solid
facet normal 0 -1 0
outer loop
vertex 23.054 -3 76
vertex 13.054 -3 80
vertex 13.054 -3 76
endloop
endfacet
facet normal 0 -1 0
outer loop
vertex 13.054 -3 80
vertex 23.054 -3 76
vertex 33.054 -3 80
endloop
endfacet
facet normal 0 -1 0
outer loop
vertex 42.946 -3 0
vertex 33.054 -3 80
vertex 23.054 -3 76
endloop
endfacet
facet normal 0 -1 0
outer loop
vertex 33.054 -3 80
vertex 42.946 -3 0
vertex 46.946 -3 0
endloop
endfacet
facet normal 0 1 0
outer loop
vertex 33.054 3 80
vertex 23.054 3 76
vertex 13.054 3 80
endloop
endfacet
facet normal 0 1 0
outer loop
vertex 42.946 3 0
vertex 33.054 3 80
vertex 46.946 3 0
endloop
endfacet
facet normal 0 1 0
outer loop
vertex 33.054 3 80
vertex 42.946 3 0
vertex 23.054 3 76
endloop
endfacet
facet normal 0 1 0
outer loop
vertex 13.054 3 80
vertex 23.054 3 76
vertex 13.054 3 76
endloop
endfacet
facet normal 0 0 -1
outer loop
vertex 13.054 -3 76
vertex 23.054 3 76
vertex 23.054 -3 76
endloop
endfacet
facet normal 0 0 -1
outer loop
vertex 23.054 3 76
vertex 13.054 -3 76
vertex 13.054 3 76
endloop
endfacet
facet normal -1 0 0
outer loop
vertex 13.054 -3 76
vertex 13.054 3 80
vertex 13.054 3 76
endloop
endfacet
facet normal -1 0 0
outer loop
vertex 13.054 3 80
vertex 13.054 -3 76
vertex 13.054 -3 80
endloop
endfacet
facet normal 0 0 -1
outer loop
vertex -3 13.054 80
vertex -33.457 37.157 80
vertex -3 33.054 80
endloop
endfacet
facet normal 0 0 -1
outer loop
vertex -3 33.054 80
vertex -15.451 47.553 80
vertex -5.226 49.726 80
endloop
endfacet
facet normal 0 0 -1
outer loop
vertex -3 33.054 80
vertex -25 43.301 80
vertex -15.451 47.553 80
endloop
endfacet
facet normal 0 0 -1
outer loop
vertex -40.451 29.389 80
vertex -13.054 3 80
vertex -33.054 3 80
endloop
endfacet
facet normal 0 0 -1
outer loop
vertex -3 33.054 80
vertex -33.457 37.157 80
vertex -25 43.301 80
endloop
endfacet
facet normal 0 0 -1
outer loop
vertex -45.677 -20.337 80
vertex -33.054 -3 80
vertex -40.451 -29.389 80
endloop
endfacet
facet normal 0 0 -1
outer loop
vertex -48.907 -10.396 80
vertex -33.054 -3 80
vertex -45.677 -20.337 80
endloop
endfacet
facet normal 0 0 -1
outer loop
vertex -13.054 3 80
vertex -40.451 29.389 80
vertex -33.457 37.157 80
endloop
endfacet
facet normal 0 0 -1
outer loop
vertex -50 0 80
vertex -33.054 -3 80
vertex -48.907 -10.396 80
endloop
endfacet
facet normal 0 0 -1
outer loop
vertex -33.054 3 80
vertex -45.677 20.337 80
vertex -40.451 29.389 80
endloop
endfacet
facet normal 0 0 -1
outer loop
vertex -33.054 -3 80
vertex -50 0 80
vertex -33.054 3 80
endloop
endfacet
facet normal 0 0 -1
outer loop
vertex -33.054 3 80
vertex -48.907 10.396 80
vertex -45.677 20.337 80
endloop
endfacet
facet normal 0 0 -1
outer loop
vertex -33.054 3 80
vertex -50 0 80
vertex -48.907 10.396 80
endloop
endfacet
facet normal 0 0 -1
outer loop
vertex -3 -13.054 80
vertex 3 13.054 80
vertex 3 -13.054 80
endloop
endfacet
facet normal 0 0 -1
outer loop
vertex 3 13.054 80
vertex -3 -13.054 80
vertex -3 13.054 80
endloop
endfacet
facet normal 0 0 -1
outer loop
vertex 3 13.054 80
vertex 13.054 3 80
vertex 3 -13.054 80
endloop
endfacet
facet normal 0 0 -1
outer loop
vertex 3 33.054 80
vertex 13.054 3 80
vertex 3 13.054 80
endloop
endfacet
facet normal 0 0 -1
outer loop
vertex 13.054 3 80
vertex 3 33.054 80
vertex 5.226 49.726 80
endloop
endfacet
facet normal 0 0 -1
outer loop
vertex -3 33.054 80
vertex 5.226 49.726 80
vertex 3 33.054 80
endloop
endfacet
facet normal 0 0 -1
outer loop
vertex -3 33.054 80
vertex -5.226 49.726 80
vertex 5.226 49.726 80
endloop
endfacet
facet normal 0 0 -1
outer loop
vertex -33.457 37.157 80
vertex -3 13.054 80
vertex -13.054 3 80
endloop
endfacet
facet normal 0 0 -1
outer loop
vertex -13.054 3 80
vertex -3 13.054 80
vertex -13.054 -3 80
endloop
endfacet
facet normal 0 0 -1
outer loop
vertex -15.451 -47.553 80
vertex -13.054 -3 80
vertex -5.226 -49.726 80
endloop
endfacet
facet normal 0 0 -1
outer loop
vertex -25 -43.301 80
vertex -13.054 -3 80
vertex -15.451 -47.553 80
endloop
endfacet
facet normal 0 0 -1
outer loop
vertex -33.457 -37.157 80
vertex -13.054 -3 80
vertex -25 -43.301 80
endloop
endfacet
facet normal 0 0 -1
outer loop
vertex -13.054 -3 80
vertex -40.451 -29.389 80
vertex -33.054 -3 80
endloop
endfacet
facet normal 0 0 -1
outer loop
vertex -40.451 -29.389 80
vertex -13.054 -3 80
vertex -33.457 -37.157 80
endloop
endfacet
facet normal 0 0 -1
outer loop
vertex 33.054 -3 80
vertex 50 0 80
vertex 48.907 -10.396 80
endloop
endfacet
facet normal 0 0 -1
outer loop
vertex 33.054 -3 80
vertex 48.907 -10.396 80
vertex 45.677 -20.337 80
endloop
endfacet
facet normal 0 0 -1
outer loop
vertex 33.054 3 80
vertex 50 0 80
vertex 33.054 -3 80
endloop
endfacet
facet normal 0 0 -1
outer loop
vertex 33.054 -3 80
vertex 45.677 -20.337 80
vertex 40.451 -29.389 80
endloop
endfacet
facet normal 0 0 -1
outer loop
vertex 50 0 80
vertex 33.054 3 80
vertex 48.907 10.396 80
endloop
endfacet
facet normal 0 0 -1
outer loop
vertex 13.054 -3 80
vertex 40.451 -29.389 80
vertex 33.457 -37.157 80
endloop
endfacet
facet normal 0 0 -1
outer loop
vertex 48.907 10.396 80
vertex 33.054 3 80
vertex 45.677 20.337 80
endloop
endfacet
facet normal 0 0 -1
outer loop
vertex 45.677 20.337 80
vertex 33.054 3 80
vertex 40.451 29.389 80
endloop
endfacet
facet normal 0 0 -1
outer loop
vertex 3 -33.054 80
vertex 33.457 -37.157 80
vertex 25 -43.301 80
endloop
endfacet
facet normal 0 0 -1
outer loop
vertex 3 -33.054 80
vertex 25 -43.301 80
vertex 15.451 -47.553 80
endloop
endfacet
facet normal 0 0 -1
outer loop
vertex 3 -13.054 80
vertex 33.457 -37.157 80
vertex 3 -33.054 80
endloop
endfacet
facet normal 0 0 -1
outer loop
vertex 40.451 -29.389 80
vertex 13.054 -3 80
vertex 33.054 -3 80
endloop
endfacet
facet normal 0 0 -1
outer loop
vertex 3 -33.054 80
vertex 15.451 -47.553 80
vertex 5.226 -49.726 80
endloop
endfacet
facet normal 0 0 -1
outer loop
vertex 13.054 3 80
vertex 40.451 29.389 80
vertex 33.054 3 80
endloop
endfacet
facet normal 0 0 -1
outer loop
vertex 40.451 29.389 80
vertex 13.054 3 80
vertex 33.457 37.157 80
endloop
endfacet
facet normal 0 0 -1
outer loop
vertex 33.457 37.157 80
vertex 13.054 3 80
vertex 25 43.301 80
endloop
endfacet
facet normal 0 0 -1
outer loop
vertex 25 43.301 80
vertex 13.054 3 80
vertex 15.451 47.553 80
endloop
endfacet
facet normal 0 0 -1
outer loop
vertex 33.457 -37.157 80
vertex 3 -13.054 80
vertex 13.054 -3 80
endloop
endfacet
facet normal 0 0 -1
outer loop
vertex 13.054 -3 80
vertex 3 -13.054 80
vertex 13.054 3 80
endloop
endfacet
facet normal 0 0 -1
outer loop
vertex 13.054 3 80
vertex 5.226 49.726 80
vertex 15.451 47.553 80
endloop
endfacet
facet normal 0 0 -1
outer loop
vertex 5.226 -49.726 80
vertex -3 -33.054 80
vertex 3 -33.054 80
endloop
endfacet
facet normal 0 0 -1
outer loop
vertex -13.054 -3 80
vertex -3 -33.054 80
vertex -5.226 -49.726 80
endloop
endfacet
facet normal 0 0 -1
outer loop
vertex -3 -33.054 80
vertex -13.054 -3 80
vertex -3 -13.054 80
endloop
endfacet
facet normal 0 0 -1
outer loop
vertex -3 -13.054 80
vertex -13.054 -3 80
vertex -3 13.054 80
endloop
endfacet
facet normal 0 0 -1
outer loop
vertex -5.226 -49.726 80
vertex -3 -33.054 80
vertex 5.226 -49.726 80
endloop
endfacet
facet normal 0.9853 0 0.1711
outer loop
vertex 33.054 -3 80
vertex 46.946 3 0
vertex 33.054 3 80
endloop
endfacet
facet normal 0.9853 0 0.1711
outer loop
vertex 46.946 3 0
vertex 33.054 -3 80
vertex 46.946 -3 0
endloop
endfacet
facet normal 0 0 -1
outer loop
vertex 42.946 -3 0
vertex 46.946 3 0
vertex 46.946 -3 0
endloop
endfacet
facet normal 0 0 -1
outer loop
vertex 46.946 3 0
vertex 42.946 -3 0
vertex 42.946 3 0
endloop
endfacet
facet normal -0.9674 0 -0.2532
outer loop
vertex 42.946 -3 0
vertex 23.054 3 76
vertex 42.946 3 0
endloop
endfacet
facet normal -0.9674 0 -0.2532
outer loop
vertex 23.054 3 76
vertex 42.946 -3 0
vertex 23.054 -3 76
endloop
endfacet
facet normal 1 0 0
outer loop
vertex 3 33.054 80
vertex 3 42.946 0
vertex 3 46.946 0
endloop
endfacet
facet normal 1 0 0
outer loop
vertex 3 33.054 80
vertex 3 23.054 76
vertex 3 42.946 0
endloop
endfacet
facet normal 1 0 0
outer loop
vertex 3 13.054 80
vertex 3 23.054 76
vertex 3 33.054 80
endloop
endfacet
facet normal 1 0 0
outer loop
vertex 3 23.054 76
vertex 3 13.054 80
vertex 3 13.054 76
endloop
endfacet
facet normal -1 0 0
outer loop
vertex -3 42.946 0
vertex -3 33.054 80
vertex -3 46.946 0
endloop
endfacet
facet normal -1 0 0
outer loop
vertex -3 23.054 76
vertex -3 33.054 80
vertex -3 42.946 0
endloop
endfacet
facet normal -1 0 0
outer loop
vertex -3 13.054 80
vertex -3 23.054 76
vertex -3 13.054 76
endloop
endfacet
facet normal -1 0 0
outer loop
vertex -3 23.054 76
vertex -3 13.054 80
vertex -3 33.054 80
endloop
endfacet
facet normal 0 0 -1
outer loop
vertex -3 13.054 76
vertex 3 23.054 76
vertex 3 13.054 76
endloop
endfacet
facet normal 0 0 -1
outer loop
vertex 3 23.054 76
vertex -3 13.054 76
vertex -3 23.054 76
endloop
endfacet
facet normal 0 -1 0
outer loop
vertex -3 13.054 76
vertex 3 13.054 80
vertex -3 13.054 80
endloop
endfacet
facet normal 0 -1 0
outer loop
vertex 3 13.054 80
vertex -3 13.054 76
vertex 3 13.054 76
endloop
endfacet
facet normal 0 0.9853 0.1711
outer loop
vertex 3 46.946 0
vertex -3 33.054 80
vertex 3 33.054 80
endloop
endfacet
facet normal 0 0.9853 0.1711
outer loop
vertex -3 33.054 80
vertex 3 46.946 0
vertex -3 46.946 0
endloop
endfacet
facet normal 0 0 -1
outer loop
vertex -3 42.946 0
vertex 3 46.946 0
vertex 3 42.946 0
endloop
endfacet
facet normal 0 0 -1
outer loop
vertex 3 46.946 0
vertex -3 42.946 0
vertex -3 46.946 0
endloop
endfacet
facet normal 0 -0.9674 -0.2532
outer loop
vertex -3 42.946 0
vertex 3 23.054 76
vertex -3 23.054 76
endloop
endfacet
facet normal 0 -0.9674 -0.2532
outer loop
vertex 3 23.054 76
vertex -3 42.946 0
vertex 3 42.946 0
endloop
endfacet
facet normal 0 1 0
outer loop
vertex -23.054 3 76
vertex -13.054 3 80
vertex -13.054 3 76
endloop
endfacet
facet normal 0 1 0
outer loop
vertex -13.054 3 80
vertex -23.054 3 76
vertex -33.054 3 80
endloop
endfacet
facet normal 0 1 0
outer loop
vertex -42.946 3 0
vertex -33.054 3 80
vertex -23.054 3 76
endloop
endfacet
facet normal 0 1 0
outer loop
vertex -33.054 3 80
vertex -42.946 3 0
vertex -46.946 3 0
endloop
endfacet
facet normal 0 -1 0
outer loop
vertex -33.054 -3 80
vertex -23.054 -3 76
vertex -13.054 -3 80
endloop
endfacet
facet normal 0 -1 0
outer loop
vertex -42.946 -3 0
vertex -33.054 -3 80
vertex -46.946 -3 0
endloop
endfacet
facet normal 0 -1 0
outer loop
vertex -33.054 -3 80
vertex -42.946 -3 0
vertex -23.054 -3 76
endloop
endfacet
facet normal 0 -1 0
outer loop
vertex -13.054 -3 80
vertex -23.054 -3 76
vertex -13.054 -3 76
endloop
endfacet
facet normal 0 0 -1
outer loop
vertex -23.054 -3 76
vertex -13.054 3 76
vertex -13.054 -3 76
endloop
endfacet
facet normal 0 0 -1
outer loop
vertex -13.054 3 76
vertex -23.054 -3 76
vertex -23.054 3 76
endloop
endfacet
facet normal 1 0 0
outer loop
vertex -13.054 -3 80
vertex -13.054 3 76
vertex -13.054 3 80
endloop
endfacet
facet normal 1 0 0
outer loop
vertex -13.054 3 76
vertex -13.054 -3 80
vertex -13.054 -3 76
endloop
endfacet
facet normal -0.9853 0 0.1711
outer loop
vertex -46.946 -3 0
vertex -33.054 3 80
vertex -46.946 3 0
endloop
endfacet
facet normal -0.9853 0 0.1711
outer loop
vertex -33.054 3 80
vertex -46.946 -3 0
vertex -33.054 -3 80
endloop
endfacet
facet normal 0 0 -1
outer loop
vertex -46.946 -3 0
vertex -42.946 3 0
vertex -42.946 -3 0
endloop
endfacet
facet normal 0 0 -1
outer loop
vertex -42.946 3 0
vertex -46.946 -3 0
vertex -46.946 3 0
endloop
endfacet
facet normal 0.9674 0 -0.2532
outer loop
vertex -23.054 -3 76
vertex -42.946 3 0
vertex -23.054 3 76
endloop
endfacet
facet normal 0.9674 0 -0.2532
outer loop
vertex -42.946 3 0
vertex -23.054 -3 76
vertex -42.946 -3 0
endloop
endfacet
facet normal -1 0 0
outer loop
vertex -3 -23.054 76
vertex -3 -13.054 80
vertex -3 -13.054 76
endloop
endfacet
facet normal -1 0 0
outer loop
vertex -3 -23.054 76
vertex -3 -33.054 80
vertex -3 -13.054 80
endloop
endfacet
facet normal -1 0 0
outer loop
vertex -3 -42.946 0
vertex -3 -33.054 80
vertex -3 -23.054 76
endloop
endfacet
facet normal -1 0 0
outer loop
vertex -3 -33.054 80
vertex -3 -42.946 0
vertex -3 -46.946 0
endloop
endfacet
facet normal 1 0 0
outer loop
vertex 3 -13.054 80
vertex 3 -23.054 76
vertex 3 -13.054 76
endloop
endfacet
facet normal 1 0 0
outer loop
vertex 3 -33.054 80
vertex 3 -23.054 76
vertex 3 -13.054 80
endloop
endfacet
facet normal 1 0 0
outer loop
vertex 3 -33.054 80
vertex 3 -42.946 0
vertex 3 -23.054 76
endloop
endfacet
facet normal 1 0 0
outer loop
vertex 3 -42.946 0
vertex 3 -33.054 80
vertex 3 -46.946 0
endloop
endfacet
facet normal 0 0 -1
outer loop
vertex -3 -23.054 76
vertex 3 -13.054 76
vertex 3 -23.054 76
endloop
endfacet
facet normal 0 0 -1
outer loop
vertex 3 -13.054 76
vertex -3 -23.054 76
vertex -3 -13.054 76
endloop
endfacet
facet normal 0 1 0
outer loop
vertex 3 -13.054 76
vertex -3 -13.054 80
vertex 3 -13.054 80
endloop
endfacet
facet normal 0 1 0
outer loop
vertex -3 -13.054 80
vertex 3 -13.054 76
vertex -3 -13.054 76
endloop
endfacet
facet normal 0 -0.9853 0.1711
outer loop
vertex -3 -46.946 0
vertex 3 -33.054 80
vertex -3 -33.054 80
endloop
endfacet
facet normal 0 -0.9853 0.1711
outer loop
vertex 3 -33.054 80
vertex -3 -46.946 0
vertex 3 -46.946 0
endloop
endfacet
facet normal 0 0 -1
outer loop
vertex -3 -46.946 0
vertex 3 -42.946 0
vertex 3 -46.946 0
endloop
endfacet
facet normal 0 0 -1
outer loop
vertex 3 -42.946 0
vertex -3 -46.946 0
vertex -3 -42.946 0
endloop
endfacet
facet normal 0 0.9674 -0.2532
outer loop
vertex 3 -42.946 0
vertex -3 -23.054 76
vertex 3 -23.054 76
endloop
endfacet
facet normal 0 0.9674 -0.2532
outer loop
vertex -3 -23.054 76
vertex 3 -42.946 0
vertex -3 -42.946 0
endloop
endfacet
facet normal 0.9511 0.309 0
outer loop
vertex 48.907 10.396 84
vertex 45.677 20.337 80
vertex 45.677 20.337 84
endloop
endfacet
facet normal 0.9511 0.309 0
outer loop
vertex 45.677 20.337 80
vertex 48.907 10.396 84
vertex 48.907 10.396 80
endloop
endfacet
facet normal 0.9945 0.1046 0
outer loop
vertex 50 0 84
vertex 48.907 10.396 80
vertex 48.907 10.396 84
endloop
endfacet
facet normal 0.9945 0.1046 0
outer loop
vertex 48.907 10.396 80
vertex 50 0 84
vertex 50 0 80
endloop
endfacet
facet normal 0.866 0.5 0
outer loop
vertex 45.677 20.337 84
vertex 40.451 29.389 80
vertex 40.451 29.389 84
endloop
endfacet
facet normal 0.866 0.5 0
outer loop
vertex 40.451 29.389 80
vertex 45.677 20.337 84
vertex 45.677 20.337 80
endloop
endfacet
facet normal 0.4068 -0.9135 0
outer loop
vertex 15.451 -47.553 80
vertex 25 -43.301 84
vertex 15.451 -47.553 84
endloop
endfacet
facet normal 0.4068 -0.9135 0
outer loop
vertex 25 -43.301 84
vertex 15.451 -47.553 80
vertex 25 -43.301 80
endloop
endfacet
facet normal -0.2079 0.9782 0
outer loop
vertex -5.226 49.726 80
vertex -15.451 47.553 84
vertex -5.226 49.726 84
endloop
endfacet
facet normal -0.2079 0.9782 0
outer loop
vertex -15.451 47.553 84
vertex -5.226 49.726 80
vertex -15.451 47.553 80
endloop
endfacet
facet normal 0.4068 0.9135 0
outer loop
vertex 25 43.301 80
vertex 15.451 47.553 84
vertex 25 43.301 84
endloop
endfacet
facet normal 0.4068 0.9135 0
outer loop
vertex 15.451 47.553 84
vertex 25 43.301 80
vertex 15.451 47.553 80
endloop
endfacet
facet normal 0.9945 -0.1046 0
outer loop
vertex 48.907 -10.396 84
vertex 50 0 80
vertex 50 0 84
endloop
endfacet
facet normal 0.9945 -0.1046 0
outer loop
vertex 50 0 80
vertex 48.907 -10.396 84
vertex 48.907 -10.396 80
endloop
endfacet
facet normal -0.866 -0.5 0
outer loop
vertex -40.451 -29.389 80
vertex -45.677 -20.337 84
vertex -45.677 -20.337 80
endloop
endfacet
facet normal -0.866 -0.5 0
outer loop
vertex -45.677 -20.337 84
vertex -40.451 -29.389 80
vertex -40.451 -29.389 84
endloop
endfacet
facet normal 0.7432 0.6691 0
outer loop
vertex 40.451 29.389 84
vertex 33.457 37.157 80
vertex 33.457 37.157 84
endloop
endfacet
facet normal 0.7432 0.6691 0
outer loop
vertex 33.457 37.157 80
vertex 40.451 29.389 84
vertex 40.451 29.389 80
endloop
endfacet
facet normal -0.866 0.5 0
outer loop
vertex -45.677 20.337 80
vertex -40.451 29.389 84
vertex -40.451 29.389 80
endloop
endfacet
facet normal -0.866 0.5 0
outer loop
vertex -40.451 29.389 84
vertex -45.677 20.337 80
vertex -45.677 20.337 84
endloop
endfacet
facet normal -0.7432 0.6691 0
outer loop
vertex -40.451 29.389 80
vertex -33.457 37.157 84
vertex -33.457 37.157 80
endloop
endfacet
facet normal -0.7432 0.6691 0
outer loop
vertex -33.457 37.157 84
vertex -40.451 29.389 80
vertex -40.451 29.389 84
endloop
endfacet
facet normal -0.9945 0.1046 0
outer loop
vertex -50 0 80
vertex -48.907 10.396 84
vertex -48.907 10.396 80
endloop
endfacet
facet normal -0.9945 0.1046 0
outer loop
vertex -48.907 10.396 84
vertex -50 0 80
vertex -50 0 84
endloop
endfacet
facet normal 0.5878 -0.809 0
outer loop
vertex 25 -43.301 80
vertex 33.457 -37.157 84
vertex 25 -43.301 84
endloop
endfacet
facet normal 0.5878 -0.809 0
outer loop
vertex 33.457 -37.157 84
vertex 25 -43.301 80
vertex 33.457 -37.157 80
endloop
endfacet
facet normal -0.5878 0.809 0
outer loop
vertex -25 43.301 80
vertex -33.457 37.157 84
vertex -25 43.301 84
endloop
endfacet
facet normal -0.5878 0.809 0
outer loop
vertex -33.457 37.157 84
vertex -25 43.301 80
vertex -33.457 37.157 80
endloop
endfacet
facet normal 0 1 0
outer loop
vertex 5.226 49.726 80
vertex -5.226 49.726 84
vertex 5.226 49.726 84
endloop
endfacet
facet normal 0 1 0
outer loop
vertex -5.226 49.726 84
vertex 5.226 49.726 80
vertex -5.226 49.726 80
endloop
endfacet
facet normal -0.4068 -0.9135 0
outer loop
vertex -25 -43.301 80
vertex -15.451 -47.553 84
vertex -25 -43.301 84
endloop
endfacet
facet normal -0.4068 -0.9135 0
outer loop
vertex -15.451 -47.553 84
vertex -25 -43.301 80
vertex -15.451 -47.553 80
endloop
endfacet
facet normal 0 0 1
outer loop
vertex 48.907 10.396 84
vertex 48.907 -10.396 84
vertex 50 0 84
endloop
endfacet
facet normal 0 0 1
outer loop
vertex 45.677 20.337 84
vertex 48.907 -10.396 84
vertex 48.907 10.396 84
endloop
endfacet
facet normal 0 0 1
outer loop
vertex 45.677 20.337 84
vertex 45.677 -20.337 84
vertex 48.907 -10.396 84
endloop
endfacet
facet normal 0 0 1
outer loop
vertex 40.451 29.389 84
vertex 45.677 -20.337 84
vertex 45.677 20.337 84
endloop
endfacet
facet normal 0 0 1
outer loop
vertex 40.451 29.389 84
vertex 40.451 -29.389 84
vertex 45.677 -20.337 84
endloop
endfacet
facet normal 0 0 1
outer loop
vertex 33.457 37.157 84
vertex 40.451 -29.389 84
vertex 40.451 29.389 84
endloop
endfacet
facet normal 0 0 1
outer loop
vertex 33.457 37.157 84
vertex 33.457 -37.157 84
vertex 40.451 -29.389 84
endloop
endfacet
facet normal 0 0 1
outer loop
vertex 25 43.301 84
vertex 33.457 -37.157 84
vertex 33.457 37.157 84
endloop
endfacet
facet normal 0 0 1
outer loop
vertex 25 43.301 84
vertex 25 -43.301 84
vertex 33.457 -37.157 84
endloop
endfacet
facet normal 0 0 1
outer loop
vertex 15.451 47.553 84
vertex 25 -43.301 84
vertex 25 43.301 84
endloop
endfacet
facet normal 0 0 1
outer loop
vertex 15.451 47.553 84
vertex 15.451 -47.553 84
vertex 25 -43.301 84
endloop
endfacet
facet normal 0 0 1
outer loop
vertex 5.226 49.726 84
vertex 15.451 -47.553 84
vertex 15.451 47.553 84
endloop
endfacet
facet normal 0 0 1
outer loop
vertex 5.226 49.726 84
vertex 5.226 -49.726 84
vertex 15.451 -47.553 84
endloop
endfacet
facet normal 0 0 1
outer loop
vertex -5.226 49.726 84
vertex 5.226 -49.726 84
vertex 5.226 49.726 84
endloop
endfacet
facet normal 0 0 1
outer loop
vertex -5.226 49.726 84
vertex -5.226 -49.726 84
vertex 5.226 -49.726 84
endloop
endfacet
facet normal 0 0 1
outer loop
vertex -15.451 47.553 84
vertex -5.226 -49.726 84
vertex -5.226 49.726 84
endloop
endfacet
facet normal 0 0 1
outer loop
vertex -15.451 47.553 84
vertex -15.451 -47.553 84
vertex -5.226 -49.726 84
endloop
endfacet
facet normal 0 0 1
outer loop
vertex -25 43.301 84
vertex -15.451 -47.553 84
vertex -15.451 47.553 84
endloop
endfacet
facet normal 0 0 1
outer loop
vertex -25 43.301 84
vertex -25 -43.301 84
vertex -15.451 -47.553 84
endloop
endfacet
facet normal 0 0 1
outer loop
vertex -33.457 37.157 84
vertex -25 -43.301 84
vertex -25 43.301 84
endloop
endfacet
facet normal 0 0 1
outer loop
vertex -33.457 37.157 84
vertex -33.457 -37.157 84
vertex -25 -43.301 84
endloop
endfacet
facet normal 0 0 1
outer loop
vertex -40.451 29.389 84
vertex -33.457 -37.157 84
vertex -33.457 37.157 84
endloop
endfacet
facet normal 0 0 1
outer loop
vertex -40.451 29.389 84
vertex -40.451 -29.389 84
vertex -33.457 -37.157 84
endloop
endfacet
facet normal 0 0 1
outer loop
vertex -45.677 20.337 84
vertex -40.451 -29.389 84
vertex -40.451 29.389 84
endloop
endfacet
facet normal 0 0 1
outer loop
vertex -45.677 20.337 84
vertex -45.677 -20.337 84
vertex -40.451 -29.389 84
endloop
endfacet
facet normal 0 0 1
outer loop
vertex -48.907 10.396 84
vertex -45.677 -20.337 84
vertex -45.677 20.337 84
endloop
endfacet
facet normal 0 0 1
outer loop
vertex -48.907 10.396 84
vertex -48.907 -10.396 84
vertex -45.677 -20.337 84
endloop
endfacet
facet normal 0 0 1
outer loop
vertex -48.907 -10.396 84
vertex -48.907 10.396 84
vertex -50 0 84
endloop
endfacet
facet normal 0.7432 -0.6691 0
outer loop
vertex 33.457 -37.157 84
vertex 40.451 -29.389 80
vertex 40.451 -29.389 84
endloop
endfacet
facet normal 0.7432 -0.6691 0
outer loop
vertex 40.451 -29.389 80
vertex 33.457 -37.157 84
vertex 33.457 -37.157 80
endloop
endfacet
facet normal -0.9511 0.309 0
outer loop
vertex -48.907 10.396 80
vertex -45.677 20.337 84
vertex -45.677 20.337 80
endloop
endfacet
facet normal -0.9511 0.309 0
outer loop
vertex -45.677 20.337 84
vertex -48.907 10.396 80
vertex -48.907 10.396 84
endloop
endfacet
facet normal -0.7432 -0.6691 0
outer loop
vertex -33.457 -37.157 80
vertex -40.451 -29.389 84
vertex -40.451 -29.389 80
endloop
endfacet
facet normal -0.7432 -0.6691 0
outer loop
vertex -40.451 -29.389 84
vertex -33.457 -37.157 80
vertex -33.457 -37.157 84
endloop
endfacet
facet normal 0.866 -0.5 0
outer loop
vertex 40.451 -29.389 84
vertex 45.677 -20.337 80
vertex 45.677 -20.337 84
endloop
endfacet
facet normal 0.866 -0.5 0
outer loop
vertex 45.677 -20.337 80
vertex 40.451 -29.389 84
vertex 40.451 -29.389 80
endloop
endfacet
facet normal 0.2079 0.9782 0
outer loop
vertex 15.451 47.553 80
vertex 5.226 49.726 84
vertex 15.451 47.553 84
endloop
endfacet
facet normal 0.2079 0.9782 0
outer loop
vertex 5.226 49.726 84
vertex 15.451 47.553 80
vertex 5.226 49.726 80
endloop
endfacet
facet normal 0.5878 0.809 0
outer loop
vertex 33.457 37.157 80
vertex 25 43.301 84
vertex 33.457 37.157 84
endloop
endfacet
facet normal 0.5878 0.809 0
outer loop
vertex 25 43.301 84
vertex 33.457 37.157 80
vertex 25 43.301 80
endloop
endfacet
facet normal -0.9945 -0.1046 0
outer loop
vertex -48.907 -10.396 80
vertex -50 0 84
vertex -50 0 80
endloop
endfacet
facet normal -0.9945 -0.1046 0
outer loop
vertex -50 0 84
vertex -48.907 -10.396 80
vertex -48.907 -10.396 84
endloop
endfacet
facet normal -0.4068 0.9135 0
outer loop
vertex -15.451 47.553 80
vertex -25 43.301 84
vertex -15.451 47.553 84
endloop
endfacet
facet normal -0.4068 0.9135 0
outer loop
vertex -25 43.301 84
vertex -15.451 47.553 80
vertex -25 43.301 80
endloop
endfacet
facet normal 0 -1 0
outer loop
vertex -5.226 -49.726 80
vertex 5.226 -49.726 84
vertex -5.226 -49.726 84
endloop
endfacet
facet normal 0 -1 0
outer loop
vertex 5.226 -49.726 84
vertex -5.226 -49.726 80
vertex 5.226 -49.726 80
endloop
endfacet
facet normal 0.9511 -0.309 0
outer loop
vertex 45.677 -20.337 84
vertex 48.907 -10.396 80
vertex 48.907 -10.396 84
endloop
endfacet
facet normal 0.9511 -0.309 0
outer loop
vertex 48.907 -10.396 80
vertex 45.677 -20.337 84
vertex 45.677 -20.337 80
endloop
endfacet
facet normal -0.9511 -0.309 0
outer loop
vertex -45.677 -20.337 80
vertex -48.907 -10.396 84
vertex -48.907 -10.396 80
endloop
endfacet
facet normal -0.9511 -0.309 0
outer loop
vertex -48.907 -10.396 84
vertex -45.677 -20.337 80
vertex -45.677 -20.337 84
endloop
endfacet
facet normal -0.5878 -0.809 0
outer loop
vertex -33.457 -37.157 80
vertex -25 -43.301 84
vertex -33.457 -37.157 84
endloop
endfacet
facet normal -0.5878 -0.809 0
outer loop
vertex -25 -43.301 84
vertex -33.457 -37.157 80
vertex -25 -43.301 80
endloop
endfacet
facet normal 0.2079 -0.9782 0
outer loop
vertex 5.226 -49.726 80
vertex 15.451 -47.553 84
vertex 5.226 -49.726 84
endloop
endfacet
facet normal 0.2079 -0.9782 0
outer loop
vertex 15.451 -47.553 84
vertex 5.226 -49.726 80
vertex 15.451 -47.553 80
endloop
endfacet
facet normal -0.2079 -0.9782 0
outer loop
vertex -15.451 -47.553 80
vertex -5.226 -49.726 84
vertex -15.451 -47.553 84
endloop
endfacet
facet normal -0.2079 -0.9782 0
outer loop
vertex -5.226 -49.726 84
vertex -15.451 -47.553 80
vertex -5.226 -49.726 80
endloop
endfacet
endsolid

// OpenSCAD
module table_leg(height){
 length = 20+cos(80)*height;
 translate([length/2, -3, 0])
  rotate([90, 0, 180])
   linear_extrude(6){
    p0 = [0, 0];
    p1 = [height * cos(80), height];
    p2 = [height * cos(80) + 20, height];
    p3 = [height * cos(80) + 20, height-4];
    p4 = [height * cos(80) + 10, height-4];
    p5 = [4, 0];
    polygon(points = [p0, p1, p2, p3, p4, p5]);
}}

module table(dia, leg_h, nr_of_legs){
 leg_radius = dia/2 - 20;
 union(){
  translate([0, 0, leg_h+2])
   cylinder(d=dia, h=4, center=true);
  for(i=[0:nr_of_legs-1]){
   translate([leg_radius * cos(360*i/nr_of_legs), 
              leg_radius * sin(360*i/nr_of_legs), 
              0]){
    rotate([0, 0, 360/nr_of_legs*i]){
     table_leg(height=leg_h);
}}}}}

table(dia=100, leg_h=80, nr_of_legs=4);
